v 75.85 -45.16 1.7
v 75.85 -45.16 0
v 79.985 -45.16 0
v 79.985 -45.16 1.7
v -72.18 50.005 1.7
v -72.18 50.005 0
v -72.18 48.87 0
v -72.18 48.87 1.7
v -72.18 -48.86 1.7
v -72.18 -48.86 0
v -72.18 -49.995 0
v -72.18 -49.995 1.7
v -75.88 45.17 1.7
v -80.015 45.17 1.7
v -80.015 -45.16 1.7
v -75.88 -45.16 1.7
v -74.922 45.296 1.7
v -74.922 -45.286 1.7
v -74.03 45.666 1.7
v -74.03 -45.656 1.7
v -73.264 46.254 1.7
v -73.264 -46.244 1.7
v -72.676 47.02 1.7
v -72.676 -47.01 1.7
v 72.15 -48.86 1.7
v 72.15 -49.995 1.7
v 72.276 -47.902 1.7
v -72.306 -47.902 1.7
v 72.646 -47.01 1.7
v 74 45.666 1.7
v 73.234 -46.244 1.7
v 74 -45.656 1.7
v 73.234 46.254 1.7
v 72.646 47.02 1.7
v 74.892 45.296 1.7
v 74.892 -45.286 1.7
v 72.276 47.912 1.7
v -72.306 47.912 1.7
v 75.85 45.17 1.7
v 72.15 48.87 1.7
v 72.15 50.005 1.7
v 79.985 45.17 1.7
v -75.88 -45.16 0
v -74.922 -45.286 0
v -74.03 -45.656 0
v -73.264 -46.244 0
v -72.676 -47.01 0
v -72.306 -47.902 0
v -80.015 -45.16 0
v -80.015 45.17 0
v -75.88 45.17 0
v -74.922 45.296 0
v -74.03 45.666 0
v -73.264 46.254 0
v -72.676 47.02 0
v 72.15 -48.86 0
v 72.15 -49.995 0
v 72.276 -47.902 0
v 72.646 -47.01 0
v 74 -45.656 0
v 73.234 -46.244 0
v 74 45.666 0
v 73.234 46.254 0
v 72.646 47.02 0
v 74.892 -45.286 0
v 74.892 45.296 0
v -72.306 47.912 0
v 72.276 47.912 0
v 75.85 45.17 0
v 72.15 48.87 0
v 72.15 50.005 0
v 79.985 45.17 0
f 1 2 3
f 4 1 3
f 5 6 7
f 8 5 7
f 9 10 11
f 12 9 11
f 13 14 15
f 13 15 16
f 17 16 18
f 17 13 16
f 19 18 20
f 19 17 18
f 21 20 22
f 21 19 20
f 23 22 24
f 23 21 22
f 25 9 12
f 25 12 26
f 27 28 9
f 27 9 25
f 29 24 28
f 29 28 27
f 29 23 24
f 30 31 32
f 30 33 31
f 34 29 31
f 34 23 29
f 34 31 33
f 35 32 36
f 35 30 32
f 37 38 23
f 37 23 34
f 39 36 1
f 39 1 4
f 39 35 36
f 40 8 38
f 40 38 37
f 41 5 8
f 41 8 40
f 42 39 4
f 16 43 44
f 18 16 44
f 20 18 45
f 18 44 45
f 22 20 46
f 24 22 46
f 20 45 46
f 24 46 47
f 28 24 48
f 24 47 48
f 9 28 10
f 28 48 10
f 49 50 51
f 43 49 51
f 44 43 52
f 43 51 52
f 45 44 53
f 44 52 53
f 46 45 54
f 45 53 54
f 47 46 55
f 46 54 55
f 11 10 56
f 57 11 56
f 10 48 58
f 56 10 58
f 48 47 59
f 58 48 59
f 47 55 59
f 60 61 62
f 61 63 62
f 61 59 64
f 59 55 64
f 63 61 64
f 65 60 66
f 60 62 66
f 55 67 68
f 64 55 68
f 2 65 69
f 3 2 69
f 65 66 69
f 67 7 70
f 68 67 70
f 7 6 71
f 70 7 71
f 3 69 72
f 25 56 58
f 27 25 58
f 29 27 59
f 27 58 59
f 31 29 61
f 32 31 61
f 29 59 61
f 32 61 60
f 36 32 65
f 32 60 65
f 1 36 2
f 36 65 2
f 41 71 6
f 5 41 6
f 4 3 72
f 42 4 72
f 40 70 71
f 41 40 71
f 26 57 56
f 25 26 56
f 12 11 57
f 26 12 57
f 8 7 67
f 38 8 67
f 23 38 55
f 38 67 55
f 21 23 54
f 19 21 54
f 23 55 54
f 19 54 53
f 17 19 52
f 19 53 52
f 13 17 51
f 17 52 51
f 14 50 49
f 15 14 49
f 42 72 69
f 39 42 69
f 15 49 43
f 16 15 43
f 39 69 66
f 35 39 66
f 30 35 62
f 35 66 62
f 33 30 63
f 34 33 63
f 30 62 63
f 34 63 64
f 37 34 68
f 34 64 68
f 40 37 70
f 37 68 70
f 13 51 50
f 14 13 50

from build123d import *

# Parameters (mm, degrees)
F1_DEPTH = 1.7


with BuildPart() as f1:
    # F0 (on Top) → F1 (new body)
    with BuildSketch(Plane.XY):
        with BuildLine():
            Line((-72.18, -48.86), (-72.18, -49.995))
            Line((-72.18, -49.995), (72.15, -49.995))
            Line((72.15, -49.995), (72.15, -48.86))
            ThreePointArc((72.15, -48.86), (73.233705, -46.243705), (75.85, -45.16))
            Line((75.85, -45.16), (79.985, -45.16))
            Line((79.985, -45.16), (79.985, 45.17))
            Line((79.985, 45.17), (75.85, 45.17))
            ThreePointArc((75.85, 45.17), (73.233705, 46.253705), (72.15, 48.87))
            Line((72.15, 48.87), (72.15, 50.005))
            Line((72.15, 50.005), (0, 50.005))
            Line((0, 50.005), (-72.18, 50.005))
            Line((-72.18, 50.005), (-72.18, 48.87))
            ThreePointArc((-72.18, 48.87), (-73.263705, 46.253705), (-75.88, 45.17))
            Line((-75.88, 45.17), (-80.015, 45.17))
            Line((-80.015, 45.17), (-80.015, 0))
            Line((-80.015, 0), (-80.015, -45.16))
            Line((-80.015, -45.16), (-75.88, -45.16))
            ThreePointArc((-75.88, -45.16), (-73.263705, -46.243705), (-72.18, -48.86))
        make_face()
    extrude(amount=F1_DEPTH)


solid = f1.part
